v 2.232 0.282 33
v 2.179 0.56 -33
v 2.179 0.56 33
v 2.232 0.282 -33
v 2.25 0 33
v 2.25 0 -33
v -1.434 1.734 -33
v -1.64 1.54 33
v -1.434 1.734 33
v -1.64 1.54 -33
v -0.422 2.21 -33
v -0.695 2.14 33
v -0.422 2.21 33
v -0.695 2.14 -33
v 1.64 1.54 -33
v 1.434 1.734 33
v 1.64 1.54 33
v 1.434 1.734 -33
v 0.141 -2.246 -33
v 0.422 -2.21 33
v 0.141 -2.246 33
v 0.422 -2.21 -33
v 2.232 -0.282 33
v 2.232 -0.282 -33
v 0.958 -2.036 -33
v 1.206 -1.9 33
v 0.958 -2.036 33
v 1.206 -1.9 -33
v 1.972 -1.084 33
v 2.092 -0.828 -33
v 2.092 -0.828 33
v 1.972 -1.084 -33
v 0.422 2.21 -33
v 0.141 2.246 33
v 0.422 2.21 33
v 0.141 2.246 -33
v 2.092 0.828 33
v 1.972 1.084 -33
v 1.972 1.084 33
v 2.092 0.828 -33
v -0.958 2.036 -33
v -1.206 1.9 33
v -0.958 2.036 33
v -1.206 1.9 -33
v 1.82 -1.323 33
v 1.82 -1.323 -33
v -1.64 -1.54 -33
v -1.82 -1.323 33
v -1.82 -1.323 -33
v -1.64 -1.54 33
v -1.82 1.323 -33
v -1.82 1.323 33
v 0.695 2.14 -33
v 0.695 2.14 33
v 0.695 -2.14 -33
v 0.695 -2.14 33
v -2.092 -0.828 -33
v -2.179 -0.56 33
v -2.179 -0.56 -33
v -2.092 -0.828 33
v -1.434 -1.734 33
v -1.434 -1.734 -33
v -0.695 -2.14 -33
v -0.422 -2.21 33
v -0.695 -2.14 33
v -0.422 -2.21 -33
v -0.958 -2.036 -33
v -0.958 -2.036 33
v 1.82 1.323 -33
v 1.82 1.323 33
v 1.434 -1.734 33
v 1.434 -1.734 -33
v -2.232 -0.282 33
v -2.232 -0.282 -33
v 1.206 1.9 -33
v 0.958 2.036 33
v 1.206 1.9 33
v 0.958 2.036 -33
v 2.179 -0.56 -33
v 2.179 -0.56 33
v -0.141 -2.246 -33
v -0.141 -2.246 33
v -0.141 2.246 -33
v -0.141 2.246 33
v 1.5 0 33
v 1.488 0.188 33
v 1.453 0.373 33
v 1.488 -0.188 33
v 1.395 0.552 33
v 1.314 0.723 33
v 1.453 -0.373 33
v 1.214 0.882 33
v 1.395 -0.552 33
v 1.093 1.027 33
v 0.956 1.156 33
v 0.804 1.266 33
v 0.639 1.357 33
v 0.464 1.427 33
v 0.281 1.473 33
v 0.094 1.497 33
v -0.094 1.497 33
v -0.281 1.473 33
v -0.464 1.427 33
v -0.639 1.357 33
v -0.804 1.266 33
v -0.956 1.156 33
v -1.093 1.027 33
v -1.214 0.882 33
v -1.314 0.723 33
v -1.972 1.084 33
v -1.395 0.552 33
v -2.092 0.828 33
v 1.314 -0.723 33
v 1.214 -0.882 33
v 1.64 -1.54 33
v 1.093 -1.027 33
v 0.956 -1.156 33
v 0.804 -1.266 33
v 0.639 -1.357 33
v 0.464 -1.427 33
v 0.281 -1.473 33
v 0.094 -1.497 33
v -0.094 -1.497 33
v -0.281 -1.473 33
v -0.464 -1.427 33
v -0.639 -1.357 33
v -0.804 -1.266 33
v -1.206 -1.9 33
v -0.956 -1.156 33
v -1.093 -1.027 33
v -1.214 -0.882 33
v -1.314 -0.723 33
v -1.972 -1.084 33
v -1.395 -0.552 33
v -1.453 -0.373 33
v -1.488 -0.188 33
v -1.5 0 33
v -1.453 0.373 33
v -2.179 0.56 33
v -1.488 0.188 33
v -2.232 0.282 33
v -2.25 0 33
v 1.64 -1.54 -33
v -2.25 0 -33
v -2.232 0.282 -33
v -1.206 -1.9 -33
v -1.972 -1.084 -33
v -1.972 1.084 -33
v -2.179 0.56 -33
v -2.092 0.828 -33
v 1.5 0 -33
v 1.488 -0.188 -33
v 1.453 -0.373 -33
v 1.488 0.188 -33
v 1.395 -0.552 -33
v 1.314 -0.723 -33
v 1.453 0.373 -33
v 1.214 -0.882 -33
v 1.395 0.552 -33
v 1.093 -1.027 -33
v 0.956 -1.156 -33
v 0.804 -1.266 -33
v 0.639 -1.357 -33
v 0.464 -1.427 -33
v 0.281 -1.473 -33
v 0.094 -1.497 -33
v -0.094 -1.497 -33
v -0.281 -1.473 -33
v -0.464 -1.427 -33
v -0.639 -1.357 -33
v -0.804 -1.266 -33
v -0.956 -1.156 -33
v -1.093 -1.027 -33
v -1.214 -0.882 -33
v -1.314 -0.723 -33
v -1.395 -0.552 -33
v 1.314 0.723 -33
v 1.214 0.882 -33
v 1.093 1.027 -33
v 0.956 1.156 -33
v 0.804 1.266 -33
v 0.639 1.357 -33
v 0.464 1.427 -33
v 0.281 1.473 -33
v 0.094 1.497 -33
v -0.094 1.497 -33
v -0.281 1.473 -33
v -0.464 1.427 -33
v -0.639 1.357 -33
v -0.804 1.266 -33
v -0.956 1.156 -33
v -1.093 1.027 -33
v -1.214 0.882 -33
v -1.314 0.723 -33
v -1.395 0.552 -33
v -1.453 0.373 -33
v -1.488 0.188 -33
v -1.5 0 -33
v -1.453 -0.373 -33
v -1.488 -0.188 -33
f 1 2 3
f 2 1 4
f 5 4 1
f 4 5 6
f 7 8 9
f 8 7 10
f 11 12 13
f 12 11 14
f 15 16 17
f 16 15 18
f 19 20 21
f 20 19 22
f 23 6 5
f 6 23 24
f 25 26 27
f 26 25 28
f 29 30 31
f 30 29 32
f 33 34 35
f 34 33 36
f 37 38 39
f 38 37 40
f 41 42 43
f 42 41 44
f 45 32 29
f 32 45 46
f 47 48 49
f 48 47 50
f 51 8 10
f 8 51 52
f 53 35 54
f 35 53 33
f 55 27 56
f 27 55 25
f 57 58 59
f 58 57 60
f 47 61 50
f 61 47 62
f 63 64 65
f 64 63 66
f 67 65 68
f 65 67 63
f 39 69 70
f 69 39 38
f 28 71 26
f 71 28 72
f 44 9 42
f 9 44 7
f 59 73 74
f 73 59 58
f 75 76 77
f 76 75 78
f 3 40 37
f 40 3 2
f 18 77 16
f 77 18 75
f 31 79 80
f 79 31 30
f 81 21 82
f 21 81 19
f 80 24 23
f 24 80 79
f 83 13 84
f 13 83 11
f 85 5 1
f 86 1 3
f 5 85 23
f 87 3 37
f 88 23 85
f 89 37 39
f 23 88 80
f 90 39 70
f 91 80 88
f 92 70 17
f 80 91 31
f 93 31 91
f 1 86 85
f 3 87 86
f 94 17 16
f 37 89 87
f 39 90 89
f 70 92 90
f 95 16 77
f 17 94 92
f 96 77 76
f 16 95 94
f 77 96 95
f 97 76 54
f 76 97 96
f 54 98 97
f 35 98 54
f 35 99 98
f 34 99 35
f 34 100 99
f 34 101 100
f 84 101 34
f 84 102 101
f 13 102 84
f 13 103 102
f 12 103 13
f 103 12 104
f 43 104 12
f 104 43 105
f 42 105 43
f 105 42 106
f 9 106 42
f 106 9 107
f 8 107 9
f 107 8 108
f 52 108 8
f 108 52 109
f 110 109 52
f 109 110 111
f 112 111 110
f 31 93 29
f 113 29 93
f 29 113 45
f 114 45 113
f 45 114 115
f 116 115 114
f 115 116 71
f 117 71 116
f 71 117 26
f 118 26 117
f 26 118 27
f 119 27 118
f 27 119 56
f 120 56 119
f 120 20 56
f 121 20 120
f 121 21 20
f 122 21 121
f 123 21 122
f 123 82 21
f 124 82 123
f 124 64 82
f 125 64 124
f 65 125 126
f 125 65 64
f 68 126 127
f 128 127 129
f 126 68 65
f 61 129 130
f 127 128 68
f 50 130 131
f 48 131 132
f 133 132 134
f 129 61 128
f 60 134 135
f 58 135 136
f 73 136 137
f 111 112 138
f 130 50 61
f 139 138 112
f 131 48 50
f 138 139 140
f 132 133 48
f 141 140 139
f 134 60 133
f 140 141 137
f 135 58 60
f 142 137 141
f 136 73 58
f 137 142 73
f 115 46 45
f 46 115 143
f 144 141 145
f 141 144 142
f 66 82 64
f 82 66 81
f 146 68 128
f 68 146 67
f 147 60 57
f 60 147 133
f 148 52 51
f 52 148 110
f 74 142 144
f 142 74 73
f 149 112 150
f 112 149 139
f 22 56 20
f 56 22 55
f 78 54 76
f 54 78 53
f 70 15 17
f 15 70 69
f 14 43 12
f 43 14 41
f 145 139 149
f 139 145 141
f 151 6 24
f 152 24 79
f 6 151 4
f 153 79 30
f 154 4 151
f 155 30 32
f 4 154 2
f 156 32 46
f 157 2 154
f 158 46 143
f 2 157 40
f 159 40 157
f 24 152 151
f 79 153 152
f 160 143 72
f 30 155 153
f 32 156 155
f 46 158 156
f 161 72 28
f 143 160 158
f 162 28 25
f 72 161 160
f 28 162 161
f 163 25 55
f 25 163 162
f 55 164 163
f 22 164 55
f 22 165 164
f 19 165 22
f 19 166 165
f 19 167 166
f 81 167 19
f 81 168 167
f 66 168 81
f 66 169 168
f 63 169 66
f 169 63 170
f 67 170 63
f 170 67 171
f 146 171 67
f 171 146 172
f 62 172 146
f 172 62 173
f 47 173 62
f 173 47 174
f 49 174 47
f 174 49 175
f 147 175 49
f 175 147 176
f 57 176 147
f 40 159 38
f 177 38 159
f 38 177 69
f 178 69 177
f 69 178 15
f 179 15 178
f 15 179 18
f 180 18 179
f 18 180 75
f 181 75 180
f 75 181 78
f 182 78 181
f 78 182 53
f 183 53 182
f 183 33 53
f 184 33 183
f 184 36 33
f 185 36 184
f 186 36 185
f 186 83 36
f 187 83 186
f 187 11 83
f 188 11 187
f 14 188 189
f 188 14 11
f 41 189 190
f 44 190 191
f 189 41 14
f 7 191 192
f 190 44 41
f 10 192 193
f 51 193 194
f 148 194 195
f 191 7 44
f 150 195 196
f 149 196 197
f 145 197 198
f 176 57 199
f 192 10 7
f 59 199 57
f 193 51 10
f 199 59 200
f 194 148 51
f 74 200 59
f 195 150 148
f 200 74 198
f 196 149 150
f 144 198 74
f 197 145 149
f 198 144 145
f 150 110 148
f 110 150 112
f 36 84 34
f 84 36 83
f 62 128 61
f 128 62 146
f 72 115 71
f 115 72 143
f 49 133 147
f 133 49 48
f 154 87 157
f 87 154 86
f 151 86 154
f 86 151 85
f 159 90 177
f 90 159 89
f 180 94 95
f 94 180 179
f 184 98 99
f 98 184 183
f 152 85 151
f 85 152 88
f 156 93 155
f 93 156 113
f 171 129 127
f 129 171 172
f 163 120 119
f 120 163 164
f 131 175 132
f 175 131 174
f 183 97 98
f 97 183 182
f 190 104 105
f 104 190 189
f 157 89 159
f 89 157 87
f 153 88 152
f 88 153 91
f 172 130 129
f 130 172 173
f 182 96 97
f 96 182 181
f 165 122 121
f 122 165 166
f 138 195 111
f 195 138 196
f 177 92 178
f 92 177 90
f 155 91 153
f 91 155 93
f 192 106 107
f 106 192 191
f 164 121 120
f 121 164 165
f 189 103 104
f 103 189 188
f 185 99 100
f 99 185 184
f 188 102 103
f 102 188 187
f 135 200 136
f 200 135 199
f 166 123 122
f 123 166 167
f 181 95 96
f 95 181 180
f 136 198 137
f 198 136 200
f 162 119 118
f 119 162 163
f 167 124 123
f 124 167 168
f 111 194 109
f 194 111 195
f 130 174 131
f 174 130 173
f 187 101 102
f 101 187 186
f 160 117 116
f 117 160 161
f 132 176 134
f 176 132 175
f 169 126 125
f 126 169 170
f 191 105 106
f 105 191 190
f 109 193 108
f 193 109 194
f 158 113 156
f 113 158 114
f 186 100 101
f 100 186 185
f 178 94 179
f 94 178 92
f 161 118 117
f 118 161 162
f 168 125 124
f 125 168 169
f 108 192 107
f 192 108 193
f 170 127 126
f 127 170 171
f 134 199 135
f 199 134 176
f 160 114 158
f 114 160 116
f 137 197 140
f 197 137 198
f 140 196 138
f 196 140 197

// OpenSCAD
$fn = 50;


difference() {
	union() {
		translate(v = [0, 0, -33.0000000000]) {
			cylinder(h = 66, r = 2.2500000000);
		}
	}
	union() {
		translate(v = [0, 0, -100.0000000000]) {
			cylinder(h = 200, r = 1.5000000000);
		}
	}
}
